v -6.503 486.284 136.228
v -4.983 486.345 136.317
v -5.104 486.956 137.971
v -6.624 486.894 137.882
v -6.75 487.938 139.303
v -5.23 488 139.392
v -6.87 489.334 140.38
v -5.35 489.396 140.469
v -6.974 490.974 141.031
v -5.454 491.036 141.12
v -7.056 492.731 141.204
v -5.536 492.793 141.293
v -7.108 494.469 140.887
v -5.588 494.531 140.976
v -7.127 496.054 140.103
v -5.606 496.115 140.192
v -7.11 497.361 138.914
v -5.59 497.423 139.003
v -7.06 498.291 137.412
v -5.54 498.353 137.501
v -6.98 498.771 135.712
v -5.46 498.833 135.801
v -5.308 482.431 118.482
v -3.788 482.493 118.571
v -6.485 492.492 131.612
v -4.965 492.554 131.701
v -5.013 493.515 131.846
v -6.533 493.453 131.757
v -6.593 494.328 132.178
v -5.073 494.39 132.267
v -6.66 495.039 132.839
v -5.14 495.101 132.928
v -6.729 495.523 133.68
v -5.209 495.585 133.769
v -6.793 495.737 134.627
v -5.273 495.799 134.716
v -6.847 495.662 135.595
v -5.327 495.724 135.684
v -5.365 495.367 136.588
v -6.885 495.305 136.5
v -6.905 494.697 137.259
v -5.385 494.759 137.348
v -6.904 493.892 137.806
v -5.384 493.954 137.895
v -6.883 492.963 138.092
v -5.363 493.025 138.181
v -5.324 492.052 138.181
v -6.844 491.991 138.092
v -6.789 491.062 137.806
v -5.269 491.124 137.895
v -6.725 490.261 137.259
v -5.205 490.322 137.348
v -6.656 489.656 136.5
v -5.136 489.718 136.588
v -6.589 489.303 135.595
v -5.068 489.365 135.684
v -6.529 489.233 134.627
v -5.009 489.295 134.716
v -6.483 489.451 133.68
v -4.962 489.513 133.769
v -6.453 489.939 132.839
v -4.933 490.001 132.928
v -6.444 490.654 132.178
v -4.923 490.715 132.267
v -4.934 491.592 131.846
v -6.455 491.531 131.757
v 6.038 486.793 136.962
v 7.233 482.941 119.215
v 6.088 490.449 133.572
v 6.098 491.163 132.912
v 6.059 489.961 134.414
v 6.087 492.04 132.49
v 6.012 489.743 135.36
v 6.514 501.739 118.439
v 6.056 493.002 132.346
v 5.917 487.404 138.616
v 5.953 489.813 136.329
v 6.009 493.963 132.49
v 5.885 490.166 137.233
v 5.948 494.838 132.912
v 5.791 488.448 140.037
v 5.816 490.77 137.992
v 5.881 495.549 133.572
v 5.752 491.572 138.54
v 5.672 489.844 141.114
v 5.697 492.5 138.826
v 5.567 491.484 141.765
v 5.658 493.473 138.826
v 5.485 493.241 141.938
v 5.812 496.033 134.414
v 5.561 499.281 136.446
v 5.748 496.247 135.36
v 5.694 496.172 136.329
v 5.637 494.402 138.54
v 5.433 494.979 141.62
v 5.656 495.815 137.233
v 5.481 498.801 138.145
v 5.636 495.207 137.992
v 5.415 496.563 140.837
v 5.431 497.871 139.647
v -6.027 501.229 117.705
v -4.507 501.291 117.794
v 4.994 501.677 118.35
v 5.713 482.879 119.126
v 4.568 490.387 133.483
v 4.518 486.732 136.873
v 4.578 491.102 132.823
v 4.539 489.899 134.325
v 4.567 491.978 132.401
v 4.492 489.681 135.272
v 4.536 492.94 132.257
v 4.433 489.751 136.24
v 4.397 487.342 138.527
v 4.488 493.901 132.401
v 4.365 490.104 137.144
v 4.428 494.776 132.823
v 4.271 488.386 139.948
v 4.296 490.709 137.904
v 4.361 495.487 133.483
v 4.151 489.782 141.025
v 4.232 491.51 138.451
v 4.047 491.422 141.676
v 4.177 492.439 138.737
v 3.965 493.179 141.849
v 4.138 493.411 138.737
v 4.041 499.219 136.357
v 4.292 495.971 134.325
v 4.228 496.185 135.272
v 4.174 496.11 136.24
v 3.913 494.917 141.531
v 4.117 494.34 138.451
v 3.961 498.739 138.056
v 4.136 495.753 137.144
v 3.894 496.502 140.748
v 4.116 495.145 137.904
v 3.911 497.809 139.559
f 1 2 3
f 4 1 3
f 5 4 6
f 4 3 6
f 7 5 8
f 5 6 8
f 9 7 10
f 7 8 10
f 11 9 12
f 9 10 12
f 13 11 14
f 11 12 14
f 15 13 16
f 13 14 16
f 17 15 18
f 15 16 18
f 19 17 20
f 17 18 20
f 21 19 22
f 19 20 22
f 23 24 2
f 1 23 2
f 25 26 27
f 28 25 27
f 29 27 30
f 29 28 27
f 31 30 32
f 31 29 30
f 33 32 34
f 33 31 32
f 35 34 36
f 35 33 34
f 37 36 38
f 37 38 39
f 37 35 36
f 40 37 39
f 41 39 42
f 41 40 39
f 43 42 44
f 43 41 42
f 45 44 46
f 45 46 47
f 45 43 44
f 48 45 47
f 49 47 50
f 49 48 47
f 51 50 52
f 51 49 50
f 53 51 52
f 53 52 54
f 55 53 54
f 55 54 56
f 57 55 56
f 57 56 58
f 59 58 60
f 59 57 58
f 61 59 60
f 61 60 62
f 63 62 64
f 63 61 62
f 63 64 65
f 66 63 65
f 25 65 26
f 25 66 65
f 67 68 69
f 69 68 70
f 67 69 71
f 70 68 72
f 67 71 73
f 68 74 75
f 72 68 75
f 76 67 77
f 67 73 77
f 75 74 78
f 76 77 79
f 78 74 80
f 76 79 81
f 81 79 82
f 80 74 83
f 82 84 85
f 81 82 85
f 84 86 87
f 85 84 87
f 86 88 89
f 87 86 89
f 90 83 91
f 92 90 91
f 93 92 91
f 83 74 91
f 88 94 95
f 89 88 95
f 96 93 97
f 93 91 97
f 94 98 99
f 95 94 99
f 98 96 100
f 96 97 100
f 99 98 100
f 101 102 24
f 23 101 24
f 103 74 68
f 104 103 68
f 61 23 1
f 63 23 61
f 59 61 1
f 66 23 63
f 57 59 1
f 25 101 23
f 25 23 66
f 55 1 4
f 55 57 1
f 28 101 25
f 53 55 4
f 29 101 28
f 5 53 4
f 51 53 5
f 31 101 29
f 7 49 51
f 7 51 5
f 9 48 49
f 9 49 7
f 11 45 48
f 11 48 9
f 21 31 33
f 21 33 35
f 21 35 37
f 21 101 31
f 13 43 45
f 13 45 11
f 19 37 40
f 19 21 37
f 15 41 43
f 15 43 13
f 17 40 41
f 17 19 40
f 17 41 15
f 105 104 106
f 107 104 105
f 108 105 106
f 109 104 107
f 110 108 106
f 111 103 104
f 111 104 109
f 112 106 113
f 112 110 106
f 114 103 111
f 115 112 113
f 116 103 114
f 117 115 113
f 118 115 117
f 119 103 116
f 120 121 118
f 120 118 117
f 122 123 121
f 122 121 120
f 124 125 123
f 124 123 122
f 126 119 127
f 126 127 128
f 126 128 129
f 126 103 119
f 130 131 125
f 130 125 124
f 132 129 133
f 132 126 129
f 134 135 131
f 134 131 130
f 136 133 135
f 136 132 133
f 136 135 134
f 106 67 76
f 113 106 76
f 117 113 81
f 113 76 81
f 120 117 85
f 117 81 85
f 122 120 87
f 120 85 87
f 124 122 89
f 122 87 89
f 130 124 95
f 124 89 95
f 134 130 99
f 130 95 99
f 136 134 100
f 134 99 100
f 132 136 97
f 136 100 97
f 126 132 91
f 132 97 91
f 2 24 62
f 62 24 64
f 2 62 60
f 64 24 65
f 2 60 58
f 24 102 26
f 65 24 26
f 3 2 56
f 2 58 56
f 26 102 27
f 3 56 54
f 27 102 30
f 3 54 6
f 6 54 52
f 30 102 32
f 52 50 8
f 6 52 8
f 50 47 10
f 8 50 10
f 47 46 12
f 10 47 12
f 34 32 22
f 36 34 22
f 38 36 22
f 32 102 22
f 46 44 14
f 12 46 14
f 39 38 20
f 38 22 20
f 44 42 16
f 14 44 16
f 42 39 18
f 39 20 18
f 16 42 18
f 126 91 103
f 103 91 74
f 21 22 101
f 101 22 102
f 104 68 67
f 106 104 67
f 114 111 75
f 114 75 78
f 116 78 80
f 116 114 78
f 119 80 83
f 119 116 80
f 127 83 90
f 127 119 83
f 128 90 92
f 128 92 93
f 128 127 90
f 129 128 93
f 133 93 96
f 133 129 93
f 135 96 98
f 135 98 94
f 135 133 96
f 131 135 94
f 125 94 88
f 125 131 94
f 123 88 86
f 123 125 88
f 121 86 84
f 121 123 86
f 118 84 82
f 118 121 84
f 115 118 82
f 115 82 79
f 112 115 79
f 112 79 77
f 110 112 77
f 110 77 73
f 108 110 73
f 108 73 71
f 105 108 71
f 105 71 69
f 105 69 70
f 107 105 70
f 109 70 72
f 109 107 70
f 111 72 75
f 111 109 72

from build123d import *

# Parameters (mm, degrees)
SKETCH1_R           = 3.2639
BOSS_EXTRUDE1_DEPTH = 6.2865
SKETCH1_2_R         = 3.2639
CUT_EXTRUDE1_DEPTH  = 4.7625


with BuildPart() as part:
    # Sketch1 → Boss-Extrude1 (new, symmetric)
    with BuildSketch(Plane(origin=(27.39550281, 1.113566762, 1.602472205), x_dir=(0.05829801557917802, 0.0023696857432327634, -0.9982964118782599), z_dir=(0.9974727182261839, 0.04054506583391268, 0.05834615695135168))):
        with BuildLine():
            Line((-116.668497282, 501.060182643), (-117.446087561, 482.248765825))
            Line((-117.446087561, 482.248765825), (-135.222725421, 486.146492507))
            ThreePointArc((-135.222725421, 486.146492507), (-140.207306403, 492.611405123), (-134.70617374, 498.642879415))
            Line((-134.70617374, 498.642879415), (-116.668497282, 501.060182643))
        make_face()
        with Locations((-133.862724494, 492.349144962)):
            Circle(SKETCH1_R, mode=Mode.SUBTRACT)
    extrude(amount=BOSS_EXTRUDE1_DEPTH, both=True)

    # Sketch1<2> → Cut-Extrude1 (cut, symmetric)
    with BuildSketch(Plane(origin=(27.39550281, 1.113566762, 1.602472205), x_dir=(0.05829801557917802, 0.0023696857432327634, -0.9982964118782599), z_dir=(0.9974727182261839, 0.04054506583391268, 0.05834615695135168))):
        with BuildLine():
            Line((-116.668497282, 501.060182643), (-117.446087561, 482.248765825))
            Line((-117.446087561, 482.248765825), (-135.222725421, 486.146492507))
            ThreePointArc((-135.222725421, 486.146492507), (-140.207306403, 492.611405123), (-134.70617374, 498.642879415))
            Line((-134.70617374, 498.642879415), (-116.668497282, 501.060182643))
        make_face()
        with Locations((-133.862724494, 492.349144962)):
            Circle(SKETCH1_2_R, mode=Mode.SUBTRACT)
    extrude(amount=CUT_EXTRUDE1_DEPTH, both=True, mode=Mode.SUBTRACT)


with BuildPart() as cut_extrude1_piece_1:
    # of the separate pieces the step leaves, piece 1, a body of its own (cut_extrude1_pieces)
    add(part.part.solids().sort_by_distance((-6.980221505, 498.77091844, 135.712368992))[0])


with BuildPart() as cut_extrude1_piece_2:
    # of the separate pieces the step leaves, piece 2, a body of its own (cut_extrude1_pieces)
    add(part.part.solids().sort_by_distance((4.040854559, 499.218900872, 136.35703568))[0])


solid = Compound([cut_extrude1_piece_1.part, cut_extrude1_piece_2.part])
